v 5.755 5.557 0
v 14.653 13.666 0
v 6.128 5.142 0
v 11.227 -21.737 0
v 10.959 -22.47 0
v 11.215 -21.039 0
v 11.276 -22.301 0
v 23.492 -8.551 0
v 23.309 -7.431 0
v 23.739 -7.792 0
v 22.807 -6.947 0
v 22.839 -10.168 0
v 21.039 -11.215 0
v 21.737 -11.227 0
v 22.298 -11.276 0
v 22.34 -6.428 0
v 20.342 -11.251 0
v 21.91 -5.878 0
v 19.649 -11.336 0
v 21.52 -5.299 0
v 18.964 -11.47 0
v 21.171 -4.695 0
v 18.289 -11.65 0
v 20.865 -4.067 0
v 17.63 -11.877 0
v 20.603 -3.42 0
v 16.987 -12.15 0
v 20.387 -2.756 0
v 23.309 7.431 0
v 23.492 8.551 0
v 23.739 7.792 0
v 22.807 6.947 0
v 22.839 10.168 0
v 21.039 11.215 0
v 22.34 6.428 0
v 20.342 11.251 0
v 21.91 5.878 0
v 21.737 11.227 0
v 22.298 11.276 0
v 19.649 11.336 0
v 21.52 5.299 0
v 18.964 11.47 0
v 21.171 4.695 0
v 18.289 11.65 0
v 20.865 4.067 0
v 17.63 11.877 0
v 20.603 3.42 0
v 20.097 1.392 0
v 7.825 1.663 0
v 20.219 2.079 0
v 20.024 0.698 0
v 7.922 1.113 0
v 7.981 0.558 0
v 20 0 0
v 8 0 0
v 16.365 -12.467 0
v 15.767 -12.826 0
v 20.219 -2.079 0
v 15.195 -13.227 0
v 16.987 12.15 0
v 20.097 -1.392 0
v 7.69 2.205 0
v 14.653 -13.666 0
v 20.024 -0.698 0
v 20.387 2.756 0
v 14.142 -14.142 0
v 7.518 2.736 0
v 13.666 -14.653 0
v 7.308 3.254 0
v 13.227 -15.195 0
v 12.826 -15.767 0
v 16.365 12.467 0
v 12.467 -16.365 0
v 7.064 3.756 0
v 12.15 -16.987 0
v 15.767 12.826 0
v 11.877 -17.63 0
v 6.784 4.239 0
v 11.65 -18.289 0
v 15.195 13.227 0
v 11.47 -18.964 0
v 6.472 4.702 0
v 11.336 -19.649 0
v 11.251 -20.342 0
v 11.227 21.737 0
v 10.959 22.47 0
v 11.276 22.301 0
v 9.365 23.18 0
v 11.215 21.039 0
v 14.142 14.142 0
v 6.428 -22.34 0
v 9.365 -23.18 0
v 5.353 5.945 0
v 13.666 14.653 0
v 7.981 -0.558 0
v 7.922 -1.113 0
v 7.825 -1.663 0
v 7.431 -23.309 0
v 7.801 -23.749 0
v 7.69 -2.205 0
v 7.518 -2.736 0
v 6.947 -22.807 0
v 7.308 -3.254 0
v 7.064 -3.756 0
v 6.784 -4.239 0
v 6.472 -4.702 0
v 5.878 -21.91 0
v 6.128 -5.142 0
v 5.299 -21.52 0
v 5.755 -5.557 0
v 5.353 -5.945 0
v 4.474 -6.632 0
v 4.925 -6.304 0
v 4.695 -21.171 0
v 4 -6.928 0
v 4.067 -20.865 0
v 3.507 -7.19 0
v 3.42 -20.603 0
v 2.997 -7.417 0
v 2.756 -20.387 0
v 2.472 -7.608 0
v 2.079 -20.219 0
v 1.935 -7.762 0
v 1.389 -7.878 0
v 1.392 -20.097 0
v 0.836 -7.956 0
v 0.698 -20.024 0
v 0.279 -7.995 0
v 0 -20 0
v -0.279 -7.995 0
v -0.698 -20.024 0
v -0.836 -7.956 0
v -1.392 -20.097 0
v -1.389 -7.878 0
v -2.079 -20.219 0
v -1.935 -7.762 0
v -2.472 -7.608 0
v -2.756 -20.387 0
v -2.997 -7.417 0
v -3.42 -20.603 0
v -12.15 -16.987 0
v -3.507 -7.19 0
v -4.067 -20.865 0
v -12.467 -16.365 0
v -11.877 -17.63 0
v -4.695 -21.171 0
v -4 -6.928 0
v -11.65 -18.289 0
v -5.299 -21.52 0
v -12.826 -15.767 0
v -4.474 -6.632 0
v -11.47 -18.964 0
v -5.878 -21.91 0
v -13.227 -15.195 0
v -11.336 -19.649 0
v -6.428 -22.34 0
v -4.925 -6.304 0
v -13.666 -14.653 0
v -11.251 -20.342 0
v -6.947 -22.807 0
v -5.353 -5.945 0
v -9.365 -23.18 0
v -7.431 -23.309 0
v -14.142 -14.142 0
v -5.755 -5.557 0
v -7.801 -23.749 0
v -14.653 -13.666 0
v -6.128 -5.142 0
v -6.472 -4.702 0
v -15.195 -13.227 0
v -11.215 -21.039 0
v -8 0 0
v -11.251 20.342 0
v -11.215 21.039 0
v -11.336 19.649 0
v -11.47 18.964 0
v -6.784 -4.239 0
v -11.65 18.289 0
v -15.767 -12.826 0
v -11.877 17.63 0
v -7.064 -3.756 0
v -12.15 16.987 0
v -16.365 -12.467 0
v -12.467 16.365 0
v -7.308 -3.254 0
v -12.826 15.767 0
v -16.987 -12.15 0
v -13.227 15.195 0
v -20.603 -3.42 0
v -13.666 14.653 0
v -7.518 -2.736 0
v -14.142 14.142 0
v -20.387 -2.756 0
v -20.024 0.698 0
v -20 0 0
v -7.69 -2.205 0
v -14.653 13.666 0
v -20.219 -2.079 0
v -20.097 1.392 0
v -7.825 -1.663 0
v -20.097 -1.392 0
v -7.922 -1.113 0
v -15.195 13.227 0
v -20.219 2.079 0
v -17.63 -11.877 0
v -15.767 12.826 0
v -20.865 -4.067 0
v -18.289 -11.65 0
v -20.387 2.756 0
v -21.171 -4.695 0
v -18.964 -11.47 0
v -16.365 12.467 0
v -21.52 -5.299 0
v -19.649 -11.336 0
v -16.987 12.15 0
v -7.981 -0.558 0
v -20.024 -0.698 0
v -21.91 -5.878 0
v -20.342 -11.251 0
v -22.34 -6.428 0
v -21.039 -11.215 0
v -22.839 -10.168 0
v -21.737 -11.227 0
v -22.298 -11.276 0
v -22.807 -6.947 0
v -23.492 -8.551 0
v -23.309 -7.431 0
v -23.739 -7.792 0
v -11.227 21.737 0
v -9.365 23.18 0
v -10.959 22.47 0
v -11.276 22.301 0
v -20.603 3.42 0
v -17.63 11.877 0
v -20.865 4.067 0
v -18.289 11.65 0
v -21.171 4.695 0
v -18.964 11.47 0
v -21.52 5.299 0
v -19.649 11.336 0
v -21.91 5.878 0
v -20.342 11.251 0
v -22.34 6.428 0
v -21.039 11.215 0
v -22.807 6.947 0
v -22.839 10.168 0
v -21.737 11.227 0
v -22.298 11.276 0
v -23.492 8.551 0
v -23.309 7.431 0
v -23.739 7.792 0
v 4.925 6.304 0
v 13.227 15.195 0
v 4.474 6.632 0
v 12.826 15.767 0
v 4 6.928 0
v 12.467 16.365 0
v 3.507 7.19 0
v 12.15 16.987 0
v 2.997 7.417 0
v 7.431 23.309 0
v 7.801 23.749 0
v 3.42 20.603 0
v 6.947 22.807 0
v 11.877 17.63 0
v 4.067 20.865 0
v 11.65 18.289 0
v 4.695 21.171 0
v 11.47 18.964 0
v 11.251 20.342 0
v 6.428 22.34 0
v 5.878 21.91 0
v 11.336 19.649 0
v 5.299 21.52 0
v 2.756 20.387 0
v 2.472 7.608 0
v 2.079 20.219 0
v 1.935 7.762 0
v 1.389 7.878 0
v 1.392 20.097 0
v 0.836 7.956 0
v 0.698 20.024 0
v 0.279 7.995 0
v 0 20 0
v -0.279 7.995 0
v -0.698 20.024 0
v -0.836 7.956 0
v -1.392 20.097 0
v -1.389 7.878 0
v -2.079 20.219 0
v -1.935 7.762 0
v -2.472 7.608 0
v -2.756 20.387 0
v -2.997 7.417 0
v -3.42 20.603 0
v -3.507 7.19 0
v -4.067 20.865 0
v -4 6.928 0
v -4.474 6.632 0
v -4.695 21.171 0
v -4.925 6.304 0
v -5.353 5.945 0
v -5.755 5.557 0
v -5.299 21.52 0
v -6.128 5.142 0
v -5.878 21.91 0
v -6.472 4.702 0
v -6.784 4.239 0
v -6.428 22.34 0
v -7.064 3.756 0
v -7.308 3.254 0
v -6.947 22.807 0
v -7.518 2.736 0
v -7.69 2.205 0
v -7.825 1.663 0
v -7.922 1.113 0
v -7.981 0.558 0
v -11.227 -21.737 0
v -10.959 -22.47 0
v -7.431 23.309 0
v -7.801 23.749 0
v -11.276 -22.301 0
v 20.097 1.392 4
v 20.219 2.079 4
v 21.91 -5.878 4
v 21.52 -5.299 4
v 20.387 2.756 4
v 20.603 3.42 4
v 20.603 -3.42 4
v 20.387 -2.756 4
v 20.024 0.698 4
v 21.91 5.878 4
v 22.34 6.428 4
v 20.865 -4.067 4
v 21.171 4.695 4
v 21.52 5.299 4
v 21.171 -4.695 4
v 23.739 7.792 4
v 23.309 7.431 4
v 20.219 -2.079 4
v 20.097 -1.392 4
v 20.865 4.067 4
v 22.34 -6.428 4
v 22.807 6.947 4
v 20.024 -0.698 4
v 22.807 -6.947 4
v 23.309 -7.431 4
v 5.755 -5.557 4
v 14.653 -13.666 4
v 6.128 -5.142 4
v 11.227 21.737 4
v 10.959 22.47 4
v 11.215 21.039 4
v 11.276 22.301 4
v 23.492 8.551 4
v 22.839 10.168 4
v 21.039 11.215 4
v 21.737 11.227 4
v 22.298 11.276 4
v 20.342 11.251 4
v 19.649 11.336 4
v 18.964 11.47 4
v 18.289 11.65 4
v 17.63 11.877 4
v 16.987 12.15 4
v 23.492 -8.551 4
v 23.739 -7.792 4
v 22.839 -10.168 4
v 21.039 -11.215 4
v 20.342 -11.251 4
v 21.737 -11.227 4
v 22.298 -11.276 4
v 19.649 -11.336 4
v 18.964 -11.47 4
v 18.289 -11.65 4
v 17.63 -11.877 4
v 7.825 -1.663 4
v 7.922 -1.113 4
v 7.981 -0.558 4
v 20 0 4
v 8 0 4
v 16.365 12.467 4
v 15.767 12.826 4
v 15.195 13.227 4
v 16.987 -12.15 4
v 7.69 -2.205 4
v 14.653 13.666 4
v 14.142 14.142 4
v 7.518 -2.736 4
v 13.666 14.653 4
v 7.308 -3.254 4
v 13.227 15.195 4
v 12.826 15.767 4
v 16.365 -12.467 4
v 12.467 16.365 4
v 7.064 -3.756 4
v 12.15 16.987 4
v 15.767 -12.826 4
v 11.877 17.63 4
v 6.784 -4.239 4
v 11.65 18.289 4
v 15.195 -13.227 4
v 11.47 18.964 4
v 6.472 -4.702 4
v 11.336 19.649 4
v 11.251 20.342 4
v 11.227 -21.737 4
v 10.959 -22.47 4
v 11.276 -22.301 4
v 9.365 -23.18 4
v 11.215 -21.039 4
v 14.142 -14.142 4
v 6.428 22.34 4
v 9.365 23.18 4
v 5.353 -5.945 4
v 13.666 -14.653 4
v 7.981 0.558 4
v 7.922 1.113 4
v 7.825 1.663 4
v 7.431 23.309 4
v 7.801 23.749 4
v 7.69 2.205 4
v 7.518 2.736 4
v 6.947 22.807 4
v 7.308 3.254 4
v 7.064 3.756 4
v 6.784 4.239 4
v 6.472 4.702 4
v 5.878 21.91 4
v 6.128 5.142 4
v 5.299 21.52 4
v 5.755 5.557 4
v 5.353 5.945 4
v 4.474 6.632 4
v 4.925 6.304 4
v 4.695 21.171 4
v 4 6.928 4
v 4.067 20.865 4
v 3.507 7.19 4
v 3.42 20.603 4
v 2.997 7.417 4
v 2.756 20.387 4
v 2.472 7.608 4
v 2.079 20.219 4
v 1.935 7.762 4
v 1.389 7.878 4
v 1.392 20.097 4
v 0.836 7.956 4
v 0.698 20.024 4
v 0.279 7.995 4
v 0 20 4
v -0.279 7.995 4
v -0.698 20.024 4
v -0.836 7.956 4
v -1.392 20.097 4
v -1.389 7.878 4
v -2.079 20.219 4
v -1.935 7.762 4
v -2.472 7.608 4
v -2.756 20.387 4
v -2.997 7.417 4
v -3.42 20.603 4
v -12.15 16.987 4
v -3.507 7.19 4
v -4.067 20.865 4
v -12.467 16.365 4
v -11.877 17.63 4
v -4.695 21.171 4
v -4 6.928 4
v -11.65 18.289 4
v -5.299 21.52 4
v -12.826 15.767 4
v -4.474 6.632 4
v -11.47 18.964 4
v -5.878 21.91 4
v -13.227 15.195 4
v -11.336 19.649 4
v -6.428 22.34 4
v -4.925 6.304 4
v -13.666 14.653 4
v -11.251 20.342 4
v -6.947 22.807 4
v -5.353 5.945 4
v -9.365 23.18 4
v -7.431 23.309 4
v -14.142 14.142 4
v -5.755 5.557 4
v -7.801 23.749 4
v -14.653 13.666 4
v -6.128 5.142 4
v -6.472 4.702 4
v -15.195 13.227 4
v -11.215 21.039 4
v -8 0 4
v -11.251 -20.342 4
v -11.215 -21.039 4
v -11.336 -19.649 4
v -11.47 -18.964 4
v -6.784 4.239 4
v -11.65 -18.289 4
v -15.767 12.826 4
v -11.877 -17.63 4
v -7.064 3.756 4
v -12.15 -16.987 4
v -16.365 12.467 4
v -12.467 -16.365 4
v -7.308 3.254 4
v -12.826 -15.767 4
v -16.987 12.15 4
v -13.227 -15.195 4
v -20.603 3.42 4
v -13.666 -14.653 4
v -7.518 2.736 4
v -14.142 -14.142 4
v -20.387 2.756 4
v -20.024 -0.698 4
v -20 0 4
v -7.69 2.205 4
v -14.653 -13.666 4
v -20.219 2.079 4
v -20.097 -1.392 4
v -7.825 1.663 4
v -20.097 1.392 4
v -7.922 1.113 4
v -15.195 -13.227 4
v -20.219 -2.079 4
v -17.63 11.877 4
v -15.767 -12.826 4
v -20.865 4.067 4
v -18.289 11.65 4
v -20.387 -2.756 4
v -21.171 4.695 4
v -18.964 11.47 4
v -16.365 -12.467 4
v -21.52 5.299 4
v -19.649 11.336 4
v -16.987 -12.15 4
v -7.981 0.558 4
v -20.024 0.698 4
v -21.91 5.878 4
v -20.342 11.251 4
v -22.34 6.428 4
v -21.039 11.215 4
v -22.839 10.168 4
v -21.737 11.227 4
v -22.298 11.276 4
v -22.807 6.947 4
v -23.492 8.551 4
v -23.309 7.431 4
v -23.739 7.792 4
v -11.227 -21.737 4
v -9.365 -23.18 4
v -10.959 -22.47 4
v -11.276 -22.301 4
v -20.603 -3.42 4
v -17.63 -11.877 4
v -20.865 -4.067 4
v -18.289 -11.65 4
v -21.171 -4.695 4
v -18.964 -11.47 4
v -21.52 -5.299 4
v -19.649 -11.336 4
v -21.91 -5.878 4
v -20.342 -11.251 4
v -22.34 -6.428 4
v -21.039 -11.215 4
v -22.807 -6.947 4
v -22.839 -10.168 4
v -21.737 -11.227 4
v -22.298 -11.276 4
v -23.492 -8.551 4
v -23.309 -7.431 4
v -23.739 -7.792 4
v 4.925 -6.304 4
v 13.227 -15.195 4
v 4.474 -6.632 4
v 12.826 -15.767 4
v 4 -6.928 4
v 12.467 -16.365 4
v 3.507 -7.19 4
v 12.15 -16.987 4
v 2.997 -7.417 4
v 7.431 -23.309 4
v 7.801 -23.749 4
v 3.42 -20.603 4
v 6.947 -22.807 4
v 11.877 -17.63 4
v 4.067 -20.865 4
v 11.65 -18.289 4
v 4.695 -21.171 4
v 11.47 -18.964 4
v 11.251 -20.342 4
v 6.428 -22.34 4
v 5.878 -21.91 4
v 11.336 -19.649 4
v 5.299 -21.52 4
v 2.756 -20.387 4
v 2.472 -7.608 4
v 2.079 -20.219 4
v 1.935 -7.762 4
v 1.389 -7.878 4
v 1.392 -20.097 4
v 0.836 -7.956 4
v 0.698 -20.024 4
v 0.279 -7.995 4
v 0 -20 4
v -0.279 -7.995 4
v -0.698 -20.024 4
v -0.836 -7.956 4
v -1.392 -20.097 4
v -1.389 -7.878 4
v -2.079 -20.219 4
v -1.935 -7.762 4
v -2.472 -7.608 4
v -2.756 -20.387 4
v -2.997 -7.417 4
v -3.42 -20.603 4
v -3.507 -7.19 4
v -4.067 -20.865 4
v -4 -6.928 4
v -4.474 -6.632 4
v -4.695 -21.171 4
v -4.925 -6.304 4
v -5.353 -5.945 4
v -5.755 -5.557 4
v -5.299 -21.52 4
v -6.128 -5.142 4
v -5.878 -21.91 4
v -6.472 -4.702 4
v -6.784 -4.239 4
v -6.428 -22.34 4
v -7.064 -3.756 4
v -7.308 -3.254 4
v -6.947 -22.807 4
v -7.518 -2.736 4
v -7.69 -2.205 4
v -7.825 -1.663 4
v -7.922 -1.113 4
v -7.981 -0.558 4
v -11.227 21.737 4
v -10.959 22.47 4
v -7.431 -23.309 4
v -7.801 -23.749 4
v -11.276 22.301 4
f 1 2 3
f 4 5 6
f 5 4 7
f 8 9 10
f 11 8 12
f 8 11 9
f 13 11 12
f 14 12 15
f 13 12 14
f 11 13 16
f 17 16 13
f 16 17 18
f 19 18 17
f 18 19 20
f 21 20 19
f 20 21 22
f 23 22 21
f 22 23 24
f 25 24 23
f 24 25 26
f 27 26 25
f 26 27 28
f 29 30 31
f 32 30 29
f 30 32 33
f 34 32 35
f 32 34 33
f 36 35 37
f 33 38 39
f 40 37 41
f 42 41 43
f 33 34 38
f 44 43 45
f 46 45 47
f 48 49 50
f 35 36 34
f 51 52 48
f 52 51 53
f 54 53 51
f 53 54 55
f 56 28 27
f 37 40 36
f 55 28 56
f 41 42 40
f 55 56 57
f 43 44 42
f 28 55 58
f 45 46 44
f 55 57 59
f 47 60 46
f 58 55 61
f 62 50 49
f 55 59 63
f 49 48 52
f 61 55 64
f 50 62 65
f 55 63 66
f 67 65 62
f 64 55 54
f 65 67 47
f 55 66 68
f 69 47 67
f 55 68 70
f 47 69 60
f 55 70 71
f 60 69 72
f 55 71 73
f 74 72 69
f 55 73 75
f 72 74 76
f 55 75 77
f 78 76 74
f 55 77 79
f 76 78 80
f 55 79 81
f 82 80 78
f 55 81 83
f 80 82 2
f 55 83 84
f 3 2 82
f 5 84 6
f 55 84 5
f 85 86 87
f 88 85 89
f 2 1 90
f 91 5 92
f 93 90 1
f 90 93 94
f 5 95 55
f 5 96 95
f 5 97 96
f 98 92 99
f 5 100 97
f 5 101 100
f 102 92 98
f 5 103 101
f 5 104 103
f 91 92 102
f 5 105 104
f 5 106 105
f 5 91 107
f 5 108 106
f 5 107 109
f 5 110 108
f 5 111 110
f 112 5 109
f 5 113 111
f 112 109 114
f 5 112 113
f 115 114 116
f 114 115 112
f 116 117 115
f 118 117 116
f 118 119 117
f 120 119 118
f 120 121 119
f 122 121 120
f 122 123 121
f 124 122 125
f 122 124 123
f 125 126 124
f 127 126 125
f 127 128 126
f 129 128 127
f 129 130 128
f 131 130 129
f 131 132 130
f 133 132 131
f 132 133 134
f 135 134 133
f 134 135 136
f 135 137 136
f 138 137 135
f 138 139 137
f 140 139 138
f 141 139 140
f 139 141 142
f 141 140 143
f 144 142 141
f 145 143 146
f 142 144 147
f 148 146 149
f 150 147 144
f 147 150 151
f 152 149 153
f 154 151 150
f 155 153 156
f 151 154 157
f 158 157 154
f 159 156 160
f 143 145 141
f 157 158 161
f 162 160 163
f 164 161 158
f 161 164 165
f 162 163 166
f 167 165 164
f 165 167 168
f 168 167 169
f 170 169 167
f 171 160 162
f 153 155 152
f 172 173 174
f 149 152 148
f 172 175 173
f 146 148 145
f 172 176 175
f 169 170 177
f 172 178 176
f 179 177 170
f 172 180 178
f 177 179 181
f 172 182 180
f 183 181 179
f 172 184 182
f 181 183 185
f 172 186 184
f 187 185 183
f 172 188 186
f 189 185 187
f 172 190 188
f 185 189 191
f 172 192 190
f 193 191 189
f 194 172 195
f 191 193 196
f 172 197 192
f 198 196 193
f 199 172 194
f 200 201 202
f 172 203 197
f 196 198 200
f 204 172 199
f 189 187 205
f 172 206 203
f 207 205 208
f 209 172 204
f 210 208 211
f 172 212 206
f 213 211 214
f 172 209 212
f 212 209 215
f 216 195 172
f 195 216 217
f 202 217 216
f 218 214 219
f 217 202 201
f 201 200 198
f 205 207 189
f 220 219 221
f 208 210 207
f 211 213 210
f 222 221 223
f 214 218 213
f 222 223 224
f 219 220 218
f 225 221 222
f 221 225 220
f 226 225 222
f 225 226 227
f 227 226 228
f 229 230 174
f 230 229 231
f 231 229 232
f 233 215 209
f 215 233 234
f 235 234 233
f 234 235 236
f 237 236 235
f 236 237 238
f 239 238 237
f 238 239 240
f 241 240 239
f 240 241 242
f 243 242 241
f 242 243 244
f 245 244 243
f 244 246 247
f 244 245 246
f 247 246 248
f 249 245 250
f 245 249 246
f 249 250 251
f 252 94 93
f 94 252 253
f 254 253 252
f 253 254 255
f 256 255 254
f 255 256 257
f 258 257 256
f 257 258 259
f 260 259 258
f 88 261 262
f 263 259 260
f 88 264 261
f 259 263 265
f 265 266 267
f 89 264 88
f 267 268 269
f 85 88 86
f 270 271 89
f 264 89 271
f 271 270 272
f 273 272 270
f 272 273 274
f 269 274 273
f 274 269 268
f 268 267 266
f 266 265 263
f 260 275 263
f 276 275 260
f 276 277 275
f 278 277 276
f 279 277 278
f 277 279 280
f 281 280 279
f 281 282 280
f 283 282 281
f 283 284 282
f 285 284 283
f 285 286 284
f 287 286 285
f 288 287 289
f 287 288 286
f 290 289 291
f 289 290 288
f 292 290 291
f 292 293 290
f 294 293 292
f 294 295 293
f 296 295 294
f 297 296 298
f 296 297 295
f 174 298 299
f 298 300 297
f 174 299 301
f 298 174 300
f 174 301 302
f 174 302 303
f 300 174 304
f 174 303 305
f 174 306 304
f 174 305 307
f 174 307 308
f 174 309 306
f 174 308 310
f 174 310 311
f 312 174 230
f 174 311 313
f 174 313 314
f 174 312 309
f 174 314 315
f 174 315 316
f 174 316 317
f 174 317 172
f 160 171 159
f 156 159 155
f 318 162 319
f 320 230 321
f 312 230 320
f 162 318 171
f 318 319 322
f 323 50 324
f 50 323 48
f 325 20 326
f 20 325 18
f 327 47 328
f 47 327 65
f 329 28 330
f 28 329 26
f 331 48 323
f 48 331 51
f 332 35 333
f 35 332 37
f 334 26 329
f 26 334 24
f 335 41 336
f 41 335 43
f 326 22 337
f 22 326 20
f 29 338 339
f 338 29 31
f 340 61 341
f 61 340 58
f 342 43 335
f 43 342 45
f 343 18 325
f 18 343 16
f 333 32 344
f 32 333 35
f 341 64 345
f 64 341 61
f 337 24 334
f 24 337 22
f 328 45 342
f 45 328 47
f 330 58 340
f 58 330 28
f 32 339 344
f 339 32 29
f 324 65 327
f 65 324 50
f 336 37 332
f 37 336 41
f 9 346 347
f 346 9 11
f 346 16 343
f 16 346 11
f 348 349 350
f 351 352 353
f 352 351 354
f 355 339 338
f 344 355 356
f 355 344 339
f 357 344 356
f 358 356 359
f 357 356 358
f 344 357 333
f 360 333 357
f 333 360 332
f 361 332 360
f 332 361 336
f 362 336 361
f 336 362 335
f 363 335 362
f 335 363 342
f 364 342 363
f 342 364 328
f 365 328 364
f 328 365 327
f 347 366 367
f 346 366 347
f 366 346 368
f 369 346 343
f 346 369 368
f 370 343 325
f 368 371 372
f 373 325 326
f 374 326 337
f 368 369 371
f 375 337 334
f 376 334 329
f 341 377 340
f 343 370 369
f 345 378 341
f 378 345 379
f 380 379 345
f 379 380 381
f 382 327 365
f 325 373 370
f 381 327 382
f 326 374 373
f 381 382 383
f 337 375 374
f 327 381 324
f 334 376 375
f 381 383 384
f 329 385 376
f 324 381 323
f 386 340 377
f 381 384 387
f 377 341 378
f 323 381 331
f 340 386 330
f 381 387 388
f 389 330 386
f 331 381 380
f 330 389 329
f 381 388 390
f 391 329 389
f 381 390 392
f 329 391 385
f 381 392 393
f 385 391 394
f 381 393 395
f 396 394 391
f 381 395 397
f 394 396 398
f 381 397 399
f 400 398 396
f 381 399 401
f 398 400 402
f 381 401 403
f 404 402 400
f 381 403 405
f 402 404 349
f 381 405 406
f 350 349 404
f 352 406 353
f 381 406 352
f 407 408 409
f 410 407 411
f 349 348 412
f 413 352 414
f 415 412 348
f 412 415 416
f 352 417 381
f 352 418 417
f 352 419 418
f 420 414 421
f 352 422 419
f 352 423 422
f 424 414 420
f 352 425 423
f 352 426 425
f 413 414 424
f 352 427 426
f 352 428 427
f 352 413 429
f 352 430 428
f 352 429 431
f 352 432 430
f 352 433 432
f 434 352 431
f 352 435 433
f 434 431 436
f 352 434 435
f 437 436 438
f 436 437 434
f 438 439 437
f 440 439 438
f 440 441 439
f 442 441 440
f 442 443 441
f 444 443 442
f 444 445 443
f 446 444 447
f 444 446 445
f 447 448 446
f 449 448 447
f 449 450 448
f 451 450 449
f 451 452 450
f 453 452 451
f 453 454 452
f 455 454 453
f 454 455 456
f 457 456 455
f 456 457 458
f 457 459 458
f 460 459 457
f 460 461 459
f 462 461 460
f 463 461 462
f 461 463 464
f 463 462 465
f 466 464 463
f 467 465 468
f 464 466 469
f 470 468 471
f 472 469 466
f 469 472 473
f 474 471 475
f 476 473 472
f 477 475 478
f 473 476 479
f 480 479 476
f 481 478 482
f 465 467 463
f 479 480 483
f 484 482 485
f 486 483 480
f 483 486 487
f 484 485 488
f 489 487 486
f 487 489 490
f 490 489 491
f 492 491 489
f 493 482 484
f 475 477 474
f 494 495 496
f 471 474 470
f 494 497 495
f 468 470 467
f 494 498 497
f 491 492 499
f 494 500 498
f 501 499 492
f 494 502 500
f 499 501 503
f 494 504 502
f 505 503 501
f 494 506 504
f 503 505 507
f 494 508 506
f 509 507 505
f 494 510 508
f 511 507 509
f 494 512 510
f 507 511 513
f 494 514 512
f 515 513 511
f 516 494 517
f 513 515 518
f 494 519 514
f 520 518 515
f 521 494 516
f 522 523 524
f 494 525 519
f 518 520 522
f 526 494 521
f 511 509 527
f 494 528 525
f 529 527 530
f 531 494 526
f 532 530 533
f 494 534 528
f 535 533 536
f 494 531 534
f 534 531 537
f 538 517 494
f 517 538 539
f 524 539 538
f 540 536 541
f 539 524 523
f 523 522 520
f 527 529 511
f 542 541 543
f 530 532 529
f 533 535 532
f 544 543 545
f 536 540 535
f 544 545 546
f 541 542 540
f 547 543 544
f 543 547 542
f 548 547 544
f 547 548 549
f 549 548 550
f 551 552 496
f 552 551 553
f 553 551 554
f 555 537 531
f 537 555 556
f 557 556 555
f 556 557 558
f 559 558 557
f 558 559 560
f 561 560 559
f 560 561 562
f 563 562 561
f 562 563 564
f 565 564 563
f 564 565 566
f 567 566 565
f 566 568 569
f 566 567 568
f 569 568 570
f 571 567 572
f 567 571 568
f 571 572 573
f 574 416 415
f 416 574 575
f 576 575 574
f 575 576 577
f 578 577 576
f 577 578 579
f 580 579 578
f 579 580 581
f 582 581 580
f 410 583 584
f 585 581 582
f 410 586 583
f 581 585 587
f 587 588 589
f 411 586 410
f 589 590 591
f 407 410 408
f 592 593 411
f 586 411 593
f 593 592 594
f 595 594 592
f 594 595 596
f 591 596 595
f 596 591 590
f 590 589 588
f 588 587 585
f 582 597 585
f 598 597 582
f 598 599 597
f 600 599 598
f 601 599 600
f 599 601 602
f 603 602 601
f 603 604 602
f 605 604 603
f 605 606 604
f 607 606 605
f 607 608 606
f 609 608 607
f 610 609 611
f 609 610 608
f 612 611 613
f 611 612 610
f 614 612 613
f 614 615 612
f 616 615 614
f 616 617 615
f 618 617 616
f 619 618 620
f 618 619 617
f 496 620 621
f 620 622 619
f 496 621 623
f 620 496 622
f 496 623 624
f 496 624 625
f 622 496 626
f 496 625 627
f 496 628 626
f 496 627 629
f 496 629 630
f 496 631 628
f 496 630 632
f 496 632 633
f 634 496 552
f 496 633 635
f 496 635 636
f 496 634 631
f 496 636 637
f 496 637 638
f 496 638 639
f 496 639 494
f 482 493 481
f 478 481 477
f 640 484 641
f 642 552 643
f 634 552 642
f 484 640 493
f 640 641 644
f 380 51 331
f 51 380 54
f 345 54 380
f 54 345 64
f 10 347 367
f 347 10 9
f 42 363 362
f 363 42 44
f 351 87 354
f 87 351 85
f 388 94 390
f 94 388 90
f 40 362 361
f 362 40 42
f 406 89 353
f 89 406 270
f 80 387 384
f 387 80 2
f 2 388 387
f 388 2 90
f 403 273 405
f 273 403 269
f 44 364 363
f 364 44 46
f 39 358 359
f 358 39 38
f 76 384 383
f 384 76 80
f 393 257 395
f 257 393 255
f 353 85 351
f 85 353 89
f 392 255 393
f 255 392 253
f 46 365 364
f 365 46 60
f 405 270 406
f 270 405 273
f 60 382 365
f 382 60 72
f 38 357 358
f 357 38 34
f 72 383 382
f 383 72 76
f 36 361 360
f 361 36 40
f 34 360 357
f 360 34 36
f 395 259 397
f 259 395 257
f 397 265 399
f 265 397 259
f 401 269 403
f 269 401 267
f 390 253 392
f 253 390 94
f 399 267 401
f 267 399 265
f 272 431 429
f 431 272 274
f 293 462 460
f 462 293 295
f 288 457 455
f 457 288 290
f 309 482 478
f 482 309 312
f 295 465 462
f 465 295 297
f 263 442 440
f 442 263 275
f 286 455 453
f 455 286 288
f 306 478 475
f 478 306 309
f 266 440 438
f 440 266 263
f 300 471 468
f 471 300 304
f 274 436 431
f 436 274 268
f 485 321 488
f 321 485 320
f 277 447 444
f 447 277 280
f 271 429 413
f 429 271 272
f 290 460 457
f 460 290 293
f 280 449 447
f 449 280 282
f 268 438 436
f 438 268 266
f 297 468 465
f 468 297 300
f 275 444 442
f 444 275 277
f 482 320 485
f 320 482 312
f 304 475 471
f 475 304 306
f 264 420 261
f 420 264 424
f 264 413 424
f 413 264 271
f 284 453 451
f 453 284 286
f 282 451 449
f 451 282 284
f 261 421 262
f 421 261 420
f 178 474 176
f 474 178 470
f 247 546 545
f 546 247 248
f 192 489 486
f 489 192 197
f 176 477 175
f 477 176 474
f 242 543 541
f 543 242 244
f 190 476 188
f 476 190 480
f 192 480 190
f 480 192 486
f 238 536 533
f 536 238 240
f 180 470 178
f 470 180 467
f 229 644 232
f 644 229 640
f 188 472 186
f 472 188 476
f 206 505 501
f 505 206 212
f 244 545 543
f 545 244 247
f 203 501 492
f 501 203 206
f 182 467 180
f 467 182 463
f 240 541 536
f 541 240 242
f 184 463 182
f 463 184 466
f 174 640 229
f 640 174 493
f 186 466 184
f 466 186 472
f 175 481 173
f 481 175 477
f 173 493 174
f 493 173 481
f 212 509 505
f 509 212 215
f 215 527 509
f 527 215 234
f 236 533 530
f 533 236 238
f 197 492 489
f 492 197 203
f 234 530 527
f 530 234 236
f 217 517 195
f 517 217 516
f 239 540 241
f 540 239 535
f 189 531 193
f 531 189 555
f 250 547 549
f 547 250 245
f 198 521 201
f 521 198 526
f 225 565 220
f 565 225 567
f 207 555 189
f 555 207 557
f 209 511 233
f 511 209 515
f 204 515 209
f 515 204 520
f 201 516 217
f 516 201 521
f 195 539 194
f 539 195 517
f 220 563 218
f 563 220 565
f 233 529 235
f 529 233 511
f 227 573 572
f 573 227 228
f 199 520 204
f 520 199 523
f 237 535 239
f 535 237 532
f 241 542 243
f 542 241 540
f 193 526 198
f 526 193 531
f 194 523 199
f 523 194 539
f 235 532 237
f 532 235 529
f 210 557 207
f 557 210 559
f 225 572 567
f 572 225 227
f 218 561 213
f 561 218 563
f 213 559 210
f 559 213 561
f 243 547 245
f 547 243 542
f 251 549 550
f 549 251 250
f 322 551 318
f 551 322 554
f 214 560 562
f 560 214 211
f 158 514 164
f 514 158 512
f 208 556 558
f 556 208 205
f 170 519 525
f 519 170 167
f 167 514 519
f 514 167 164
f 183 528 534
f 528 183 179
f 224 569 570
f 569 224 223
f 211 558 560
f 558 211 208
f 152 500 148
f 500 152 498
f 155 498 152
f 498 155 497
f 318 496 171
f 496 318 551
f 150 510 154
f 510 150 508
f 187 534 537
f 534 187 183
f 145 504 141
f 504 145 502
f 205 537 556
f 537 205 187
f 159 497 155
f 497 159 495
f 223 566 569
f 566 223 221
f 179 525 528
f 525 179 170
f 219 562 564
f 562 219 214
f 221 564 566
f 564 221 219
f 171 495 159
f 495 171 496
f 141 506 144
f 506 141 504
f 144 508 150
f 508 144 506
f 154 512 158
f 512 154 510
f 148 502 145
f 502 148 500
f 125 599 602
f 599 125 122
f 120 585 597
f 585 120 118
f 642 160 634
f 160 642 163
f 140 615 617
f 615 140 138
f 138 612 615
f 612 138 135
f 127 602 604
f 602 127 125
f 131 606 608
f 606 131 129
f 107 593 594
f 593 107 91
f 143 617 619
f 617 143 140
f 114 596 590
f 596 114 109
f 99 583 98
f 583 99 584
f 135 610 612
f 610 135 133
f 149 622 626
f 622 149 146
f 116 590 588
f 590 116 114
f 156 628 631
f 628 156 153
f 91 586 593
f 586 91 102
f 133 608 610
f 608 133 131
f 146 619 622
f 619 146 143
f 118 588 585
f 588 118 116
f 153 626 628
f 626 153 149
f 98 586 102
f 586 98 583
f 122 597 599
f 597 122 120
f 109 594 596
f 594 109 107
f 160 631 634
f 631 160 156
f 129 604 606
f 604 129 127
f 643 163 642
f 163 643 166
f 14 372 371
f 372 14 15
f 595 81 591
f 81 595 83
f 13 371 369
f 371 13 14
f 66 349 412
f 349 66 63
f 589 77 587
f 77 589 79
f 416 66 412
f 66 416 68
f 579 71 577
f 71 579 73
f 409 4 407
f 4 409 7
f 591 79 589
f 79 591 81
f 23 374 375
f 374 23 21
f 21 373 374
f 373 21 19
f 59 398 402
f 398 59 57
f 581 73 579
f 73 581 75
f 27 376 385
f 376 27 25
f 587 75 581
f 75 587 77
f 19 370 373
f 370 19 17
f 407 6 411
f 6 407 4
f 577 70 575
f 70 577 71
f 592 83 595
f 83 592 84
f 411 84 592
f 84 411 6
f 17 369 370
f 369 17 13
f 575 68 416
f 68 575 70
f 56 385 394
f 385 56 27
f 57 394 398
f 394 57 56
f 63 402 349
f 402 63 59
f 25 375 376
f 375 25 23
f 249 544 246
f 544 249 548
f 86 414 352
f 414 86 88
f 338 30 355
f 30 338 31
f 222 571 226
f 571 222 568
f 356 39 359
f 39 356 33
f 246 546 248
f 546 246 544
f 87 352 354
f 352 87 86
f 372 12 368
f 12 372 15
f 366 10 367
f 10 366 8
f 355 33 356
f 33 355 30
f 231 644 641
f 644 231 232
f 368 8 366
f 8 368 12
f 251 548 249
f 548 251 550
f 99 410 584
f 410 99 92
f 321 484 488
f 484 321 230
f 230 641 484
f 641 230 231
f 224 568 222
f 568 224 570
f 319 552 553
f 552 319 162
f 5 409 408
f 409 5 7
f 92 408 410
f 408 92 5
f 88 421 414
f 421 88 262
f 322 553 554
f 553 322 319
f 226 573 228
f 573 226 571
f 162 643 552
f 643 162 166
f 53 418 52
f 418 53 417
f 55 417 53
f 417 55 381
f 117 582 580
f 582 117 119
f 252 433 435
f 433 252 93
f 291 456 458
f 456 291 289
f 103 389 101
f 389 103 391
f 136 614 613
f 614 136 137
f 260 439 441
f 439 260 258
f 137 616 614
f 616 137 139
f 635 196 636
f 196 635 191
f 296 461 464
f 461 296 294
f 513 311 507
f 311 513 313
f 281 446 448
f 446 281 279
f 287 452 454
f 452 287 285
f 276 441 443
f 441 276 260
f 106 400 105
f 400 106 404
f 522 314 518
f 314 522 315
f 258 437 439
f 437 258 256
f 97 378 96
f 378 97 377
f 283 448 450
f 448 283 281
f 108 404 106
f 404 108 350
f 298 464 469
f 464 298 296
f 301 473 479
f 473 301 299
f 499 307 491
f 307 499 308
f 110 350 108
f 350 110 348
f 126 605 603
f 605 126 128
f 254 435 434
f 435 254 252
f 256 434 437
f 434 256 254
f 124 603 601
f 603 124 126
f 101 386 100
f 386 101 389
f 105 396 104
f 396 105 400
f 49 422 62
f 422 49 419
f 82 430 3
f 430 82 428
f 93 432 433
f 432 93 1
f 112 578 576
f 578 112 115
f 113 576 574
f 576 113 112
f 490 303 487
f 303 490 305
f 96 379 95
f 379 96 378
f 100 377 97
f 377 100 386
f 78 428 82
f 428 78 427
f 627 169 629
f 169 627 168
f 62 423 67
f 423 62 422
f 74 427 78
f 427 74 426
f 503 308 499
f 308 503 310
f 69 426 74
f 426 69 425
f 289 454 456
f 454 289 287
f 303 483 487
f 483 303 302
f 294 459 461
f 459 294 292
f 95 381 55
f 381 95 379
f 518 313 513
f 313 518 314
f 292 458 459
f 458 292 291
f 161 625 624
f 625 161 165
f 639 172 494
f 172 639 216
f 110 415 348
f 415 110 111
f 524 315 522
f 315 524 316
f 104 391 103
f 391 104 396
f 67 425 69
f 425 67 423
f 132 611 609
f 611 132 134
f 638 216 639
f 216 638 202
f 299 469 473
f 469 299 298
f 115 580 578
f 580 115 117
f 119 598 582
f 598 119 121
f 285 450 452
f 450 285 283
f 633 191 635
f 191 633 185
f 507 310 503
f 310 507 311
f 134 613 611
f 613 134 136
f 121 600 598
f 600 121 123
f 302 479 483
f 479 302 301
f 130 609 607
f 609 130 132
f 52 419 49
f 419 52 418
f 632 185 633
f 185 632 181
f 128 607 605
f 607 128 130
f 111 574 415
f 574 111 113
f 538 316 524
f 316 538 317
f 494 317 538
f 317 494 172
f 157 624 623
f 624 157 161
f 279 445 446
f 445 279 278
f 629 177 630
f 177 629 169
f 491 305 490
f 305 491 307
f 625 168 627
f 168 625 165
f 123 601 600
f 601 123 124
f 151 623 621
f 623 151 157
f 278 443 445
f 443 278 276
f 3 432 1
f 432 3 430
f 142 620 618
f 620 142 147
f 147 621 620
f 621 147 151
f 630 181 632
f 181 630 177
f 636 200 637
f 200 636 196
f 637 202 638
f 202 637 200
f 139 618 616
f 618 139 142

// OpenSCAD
$fn = 90;

height = 4;
diameter = 50;
difference(){
	cylinder(d=diameter, h=height);
	#cylinder(d=16, h=height);
	for(angle = [0:45:360]){
		rotate([0, 0, angle])
			translate([diameter/2+5, 0, 0])
				#cylinder(d=20, h=height);
	}
}
